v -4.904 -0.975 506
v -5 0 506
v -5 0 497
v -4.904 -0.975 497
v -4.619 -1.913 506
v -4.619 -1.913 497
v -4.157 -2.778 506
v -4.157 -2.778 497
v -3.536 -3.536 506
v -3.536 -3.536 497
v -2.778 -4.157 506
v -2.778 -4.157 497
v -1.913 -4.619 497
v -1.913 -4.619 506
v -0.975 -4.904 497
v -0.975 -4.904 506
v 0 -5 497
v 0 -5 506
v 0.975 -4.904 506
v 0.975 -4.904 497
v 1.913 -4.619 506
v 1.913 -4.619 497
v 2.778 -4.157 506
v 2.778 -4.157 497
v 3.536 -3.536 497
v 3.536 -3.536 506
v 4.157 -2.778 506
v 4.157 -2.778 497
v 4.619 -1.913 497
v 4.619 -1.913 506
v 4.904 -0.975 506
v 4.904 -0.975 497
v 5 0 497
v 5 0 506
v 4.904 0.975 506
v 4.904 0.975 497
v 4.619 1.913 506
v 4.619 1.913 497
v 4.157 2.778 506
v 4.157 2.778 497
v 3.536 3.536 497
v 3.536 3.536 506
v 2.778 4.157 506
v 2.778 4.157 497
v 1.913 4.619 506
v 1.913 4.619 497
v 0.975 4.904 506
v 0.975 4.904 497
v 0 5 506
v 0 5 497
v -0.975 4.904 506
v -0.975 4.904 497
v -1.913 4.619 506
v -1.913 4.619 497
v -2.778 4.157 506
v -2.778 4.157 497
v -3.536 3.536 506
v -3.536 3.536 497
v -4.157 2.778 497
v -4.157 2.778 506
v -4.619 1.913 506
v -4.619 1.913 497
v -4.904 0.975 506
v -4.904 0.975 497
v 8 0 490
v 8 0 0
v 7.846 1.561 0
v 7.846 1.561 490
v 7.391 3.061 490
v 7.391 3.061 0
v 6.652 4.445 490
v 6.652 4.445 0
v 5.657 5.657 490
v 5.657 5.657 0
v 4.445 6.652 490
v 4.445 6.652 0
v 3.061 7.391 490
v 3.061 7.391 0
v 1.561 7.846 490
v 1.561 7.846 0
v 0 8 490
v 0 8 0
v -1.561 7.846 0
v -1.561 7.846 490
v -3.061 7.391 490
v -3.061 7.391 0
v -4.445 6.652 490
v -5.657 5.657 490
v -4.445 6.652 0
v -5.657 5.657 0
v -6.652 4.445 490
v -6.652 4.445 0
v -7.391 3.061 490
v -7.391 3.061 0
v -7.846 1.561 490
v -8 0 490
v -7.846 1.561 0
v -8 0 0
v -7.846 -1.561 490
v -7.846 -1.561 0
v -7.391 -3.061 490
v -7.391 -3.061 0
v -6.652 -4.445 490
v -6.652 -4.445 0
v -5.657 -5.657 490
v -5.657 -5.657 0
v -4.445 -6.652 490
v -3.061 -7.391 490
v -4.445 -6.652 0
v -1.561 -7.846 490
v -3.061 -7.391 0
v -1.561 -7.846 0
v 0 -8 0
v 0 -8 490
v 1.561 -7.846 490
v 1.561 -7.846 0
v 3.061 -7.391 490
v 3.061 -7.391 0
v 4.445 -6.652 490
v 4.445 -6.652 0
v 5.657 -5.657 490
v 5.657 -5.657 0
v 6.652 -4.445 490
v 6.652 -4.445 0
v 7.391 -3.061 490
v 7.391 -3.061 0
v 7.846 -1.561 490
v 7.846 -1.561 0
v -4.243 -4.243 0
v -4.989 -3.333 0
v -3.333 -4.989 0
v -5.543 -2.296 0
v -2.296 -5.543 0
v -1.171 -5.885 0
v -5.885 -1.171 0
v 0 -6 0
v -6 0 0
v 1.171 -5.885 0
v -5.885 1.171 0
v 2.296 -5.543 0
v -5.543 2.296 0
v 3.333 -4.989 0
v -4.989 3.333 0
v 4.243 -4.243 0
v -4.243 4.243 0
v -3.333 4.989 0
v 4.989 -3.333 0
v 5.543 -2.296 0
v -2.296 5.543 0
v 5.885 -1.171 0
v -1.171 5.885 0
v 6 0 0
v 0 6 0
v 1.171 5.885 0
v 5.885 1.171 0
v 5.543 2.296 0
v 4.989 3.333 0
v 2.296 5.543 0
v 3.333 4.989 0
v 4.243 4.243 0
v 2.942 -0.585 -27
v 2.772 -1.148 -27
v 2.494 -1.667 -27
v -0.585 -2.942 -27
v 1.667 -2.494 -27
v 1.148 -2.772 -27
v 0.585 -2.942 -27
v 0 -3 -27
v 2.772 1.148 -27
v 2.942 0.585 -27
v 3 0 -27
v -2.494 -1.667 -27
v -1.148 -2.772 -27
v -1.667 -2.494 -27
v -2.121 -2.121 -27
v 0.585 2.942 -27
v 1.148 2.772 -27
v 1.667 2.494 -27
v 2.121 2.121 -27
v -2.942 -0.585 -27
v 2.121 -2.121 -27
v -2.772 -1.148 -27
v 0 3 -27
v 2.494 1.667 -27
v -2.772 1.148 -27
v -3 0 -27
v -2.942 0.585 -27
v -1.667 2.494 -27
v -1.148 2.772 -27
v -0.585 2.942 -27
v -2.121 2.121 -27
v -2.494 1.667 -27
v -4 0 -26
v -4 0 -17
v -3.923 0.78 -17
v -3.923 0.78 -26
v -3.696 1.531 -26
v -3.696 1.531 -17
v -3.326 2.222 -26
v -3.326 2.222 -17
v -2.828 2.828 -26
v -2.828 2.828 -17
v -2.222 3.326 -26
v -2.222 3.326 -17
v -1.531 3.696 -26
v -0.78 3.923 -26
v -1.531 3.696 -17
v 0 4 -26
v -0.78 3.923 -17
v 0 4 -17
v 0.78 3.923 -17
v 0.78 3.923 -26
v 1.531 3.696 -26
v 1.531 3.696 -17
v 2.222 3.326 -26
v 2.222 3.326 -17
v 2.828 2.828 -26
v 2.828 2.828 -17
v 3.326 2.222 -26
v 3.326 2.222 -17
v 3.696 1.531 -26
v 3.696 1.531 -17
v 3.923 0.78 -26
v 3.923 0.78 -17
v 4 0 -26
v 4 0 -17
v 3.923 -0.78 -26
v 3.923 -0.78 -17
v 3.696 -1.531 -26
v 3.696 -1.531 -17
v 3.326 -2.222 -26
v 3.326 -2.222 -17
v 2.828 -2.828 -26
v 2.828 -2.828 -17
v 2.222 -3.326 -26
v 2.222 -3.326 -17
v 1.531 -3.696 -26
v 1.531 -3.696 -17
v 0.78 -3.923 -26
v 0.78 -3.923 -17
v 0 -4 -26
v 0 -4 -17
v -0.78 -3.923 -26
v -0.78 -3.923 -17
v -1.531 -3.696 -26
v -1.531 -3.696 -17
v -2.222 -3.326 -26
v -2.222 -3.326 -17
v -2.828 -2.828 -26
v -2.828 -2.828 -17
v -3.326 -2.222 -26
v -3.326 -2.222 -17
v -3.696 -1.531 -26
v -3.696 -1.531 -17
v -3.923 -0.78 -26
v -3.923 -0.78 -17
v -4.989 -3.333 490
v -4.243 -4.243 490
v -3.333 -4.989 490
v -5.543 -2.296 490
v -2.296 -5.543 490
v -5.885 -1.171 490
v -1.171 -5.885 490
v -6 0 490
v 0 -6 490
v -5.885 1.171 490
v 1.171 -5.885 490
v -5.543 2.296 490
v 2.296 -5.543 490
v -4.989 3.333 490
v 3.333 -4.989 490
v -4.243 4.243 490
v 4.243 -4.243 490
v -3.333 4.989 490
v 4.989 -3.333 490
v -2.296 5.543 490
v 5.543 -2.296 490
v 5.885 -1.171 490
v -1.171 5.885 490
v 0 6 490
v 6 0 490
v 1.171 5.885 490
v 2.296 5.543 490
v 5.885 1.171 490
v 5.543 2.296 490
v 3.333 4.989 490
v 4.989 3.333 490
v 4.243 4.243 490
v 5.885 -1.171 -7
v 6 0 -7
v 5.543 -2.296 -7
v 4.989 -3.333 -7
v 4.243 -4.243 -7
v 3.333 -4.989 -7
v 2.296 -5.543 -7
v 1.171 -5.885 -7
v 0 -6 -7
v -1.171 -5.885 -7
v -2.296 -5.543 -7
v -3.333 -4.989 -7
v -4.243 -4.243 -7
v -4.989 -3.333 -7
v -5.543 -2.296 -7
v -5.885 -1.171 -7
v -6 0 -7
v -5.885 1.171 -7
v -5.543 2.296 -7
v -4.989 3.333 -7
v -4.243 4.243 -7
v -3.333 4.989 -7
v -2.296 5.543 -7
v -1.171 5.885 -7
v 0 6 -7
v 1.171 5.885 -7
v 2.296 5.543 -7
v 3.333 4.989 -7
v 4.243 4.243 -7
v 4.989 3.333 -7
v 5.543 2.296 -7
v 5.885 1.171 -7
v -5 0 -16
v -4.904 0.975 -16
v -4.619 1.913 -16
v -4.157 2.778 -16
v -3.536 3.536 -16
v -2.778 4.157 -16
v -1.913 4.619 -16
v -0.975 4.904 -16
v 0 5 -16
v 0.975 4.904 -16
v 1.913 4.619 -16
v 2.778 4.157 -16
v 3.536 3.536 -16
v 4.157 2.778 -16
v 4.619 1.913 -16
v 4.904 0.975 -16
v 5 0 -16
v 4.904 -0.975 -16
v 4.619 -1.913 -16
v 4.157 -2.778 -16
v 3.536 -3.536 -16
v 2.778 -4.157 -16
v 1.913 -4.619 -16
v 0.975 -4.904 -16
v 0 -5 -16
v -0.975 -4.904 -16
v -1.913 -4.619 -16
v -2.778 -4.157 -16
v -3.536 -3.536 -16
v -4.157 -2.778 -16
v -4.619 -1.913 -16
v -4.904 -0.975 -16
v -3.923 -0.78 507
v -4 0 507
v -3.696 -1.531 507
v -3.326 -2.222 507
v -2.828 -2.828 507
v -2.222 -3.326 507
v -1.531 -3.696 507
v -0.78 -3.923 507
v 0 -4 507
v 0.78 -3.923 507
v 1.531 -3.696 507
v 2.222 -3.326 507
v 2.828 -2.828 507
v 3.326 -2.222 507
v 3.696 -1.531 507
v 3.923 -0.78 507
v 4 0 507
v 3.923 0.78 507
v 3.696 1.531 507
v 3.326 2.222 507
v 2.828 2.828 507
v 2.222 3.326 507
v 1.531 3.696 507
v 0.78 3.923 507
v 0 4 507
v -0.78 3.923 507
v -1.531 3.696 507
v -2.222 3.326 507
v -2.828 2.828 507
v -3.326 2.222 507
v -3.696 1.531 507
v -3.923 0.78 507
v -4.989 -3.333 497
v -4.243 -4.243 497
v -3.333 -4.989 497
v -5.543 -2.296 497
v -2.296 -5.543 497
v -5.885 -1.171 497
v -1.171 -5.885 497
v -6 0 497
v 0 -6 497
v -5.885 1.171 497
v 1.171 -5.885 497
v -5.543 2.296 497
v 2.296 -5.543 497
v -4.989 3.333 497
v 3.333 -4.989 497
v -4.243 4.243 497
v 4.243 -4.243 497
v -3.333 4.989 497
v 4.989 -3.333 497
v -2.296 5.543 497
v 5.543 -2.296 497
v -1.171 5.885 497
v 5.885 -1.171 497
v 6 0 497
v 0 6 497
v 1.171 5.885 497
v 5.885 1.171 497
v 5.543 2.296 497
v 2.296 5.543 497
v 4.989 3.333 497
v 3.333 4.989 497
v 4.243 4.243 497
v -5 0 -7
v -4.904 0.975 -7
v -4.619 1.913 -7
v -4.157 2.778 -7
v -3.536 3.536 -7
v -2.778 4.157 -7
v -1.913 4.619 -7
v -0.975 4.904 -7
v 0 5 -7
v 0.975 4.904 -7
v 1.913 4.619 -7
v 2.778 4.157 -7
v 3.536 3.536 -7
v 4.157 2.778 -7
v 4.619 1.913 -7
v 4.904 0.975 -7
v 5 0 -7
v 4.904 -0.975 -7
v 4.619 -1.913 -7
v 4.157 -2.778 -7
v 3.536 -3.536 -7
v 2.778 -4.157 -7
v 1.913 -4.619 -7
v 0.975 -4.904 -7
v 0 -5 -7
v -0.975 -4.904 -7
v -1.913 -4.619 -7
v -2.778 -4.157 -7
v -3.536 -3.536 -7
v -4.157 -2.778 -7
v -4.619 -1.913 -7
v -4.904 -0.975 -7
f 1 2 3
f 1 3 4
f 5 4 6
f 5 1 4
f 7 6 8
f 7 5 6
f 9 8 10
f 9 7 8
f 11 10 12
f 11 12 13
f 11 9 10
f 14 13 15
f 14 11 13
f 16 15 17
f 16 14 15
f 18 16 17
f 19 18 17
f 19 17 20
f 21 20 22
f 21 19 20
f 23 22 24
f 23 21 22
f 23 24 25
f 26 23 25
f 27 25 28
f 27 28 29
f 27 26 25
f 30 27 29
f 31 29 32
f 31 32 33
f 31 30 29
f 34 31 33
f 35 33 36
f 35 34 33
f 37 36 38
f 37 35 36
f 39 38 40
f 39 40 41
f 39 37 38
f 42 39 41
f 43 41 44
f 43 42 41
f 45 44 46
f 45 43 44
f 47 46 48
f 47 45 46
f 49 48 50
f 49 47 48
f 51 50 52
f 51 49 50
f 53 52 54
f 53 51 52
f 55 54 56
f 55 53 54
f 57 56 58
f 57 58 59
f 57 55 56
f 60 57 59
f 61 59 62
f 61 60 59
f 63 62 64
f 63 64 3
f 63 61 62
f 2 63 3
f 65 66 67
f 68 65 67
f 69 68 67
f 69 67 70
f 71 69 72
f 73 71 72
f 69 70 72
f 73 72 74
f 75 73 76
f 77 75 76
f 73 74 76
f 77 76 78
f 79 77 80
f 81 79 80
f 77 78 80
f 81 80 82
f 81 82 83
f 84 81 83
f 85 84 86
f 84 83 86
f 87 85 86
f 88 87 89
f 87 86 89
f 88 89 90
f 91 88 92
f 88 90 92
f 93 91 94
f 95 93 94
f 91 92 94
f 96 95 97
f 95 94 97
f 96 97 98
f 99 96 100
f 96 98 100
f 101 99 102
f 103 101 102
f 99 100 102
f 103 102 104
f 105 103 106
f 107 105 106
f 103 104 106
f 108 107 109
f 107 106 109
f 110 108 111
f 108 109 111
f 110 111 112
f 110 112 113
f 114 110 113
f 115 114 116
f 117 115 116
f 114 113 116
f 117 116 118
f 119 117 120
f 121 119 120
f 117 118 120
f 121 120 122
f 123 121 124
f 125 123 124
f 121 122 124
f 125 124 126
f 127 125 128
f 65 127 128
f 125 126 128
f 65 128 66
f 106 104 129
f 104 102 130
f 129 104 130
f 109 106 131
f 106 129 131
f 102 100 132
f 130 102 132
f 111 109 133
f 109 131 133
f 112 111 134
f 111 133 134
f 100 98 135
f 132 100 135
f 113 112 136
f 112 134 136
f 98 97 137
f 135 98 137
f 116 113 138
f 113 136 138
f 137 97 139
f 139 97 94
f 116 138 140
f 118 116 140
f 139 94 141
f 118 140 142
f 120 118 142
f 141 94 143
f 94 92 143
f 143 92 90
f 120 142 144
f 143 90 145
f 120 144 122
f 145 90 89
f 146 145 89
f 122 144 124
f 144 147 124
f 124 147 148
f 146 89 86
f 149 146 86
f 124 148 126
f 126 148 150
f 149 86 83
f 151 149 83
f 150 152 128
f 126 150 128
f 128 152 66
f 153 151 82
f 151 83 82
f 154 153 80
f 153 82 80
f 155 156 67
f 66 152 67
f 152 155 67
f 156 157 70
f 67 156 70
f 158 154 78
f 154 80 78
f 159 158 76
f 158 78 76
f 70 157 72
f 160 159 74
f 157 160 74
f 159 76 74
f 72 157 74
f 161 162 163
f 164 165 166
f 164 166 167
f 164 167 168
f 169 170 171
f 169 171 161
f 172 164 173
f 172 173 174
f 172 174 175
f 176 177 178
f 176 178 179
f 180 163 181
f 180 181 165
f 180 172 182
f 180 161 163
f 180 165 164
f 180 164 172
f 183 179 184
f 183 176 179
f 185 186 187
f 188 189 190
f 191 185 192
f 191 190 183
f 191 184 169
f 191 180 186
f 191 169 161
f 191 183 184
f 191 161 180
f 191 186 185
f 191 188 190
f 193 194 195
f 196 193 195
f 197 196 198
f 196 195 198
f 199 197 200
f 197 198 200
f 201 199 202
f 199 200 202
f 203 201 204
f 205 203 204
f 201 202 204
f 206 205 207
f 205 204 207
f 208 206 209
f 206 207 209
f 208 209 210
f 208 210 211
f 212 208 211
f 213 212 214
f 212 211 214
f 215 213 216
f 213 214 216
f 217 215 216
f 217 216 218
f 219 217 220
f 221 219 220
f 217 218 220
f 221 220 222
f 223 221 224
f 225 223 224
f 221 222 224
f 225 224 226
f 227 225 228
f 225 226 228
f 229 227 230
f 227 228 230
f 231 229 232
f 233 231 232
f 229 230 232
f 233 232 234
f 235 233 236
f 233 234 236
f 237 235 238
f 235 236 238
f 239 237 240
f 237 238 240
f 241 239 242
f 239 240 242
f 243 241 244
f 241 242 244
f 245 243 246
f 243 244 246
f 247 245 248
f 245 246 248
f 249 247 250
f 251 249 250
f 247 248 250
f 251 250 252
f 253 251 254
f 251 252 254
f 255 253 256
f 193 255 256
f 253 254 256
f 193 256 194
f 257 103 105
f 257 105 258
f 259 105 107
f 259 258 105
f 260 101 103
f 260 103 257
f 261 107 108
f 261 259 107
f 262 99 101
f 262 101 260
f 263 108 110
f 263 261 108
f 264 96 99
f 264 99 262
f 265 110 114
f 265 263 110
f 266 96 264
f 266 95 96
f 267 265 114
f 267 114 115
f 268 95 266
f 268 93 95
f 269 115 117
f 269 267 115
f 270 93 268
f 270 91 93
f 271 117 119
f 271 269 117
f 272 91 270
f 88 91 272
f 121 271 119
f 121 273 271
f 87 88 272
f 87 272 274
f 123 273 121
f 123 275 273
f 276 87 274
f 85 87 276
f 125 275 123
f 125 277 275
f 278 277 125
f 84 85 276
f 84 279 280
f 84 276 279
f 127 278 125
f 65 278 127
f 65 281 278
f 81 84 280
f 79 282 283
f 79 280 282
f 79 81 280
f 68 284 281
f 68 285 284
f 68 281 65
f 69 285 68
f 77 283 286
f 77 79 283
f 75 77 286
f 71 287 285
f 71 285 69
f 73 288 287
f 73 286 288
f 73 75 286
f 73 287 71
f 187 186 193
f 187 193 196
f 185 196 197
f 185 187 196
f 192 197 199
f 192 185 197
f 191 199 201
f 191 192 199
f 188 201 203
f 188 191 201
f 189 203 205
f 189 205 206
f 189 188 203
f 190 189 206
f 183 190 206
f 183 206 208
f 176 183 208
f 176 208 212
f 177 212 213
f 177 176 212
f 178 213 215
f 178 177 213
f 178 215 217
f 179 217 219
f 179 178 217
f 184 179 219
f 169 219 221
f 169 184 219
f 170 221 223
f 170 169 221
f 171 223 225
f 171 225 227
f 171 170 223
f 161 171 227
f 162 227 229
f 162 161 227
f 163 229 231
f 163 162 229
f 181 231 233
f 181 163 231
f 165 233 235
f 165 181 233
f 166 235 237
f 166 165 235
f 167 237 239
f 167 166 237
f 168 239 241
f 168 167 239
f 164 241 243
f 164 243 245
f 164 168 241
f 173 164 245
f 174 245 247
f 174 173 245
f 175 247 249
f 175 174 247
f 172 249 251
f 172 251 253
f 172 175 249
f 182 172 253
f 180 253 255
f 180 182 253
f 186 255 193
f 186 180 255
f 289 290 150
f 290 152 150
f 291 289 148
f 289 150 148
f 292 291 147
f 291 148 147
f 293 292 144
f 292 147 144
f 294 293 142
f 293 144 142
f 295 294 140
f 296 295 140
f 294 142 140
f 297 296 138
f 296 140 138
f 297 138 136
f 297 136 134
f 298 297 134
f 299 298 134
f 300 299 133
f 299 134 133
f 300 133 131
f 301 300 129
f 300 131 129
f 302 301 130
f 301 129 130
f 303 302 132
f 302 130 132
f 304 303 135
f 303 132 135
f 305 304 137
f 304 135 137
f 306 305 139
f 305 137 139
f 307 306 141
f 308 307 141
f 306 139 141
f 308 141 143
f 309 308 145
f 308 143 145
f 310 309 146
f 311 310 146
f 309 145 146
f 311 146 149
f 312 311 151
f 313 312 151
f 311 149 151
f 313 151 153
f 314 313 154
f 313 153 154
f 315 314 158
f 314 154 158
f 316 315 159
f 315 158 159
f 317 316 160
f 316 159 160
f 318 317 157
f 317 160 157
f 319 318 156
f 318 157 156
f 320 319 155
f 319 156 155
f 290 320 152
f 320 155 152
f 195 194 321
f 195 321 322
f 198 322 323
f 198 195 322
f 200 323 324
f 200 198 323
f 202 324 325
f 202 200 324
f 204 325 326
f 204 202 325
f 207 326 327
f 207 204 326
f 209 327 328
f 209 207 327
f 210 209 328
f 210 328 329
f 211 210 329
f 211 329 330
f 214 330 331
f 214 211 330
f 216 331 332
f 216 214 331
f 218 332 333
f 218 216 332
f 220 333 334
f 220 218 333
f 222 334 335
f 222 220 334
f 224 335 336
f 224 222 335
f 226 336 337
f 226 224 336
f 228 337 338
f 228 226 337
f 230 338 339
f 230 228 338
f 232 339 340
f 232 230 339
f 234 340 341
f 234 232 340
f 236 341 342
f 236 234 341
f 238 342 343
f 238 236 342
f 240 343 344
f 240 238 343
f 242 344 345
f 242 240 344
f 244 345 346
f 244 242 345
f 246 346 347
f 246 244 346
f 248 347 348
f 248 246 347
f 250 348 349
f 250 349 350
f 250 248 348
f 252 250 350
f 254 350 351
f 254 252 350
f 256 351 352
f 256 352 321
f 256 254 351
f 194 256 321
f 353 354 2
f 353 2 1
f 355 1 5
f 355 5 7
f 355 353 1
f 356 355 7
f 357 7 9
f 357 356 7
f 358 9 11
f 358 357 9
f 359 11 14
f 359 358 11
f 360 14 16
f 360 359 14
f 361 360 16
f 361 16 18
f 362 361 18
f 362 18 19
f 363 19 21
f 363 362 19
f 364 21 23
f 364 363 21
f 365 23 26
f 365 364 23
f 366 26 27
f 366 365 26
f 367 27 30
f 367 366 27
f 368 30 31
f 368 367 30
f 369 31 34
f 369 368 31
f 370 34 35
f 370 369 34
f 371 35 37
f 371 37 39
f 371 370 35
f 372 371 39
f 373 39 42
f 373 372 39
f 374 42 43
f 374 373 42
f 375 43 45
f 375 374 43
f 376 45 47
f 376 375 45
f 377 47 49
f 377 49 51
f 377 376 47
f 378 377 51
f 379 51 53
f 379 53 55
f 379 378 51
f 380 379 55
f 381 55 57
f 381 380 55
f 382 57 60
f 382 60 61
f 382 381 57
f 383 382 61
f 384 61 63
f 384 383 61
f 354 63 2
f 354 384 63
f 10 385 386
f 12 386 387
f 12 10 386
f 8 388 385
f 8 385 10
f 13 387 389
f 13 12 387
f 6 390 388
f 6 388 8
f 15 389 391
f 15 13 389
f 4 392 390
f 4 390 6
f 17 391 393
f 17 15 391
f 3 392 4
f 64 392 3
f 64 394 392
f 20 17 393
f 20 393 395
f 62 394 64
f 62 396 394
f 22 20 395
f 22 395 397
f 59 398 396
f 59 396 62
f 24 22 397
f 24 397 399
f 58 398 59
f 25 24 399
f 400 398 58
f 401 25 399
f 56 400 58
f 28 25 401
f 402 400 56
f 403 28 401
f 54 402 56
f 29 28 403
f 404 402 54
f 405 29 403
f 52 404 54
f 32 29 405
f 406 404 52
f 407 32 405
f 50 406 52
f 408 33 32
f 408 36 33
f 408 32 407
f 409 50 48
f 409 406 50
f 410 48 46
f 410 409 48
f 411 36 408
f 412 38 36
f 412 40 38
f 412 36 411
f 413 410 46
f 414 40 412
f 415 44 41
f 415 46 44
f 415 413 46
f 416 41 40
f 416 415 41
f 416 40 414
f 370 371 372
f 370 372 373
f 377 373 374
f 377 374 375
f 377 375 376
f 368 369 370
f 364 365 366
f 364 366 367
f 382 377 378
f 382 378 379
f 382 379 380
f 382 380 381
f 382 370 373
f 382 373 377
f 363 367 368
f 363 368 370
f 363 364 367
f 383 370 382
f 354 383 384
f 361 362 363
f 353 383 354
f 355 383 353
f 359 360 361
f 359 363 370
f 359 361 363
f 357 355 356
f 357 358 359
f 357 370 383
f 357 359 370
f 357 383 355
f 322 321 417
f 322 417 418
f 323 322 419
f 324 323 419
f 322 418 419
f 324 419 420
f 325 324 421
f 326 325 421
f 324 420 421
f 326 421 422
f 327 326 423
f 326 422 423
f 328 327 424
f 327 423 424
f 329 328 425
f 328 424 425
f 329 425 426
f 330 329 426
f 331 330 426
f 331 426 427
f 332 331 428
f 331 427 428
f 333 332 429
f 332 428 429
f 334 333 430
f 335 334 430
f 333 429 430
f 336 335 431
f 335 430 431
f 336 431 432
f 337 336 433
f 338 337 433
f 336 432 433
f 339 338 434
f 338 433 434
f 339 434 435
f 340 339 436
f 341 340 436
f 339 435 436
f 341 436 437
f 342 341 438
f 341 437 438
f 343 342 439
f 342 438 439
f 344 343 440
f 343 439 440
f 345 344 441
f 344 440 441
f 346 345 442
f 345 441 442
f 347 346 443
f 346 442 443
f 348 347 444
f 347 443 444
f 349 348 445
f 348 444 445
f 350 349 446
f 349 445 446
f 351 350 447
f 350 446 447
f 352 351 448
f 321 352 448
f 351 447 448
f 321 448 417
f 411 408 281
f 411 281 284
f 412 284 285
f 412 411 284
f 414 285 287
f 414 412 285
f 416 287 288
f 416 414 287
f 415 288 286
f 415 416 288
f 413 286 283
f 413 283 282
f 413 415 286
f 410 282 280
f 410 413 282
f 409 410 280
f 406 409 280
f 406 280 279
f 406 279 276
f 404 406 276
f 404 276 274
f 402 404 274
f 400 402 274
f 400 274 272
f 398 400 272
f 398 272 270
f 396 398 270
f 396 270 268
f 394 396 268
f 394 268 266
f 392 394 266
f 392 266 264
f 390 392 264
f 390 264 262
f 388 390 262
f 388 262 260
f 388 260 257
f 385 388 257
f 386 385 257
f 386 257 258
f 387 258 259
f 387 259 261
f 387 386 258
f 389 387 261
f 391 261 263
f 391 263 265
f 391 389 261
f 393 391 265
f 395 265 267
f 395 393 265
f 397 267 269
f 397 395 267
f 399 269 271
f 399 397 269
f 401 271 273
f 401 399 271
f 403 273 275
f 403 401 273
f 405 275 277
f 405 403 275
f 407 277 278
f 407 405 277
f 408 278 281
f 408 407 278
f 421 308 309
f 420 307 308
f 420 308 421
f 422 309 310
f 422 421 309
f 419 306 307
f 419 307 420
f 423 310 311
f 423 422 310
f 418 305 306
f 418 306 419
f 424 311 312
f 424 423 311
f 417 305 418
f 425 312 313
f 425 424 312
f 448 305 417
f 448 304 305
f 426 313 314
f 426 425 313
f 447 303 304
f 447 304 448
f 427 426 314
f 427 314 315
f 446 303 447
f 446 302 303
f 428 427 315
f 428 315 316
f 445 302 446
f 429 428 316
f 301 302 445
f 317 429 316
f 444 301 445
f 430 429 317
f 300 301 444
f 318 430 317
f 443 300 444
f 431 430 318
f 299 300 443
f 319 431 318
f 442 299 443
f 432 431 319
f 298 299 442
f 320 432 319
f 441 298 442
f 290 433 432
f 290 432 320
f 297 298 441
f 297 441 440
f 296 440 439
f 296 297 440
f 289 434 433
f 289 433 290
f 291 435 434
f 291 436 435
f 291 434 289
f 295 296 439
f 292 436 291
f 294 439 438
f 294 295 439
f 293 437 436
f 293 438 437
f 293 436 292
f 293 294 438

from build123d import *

# Parameters (mm, degrees)
SKETCH1_R           = 8
BOSS_EXTRUDE1_DEPTH = 490
SKETCH6_R           = 6
BOSS_EXTRUDE2_DEPTH = 5
SKETCH7_R           = 6
BOSS_EXTRUDE3_DEPTH = 2
SKETCH8_R           = 5
BOSS_EXTRUDE4_DEPTH = 10
SKETCH9_R           = 4
BOSS_EXTRUDE5_DEPTH = 10
CHAMFER1_SIZE       = 1
CHAMFER2_SIZE       = 1
BOSS_EXTRUDE6_START = 5
SKETCH10_R          = 6
BOSS_EXTRUDE6_DEPTH = 5
BOSS_EXTRUDE7_START = 2
SKETCH11_R          = 6
BOSS_EXTRUDE7_DEPTH = 2
BOSS_EXTRUDE8_START = 10
SKETCH12_R          = 5
BOSS_EXTRUDE8_DEPTH = 10
CHAMFER3_SIZE       = 1


with BuildPart() as part:
    # Sketch1 → Boss-Extrude1 (new body)
    with BuildSketch(Plane.XY):
        Circle(SKETCH1_R)
    extrude(amount=BOSS_EXTRUDE1_DEPTH)

    # Sketch6 → Boss-Extrude2 (add)
    with BuildSketch(Plane(origin=(0, 0, 0), x_dir=(-1, 0, 0), z_dir=(0, 0, -1))):
        with Locations(Location((0, 0, 0), (0, 0, 180))):
            Circle(SKETCH6_R)
    extrude(amount=BOSS_EXTRUDE2_DEPTH)

    # Sketch7 → Boss-Extrude3 (add)
    with BuildSketch(Plane(origin=(0, 0, -5), x_dir=(-1, 0, 0), z_dir=(0, 0, -1))):
        with Locations(Location((0, 0, 0), (0, 0, 180))):
            Circle(SKETCH7_R)
    extrude(amount=BOSS_EXTRUDE3_DEPTH)

    # Sketch8 → Boss-Extrude4 (add)
    with BuildSketch(Plane(origin=(0, 0, -7), x_dir=(-1, 0, 0), z_dir=(0, 0, -1))):
        Circle(SKETCH8_R)
    extrude(amount=BOSS_EXTRUDE4_DEPTH)

    # Sketch9 → Boss-Extrude5 (add)
    with BuildSketch(Plane(origin=(0, 0, -17), x_dir=(-1, 0, 0), z_dir=(0, 0, -1))):
        Circle(SKETCH9_R)
    extrude(amount=BOSS_EXTRUDE5_DEPTH)

    # Chamfer1
    chamfer1_edges = [part.edges().sort_by_distance(p)[0] for p in [
        (5, 0, -17),
    ]]
    chamfer(chamfer1_edges, length=CHAMFER1_SIZE - 0.0001)  # a hair under: the kernel refuses the full size

    # Chamfer2
    chamfer2_edges = [part.edges().sort_by_distance(p)[0] for p in [
        (4, 0, -27),
    ]]
    chamfer(chamfer2_edges, length=CHAMFER2_SIZE)

    # Sketch10 → Boss-Extrude6 (add)
    with BuildSketch(Plane.XY.offset(490).offset(BOSS_EXTRUDE6_START)):
        Circle(SKETCH10_R)
    extrude(amount=-BOSS_EXTRUDE6_DEPTH)

    # Sketch11 → Boss-Extrude7 (add)
    with BuildSketch(Plane.XY.offset(495).offset(BOSS_EXTRUDE7_START)):
        Circle(SKETCH11_R)
    extrude(amount=-BOSS_EXTRUDE7_DEPTH)

    # Sketch12 → Boss-Extrude8 (add)
    with BuildSketch(Plane.XY.offset(497).offset(BOSS_EXTRUDE8_START)):
        with Locations(Location((0, 0, 0), (0, 0, 180))):
            Circle(SKETCH12_R)
    extrude(amount=-BOSS_EXTRUDE8_DEPTH)

    # Chamfer3
    chamfer3_edges = [part.edges().sort_by_distance(p)[0] for p in [
        (5, 0, 507),
    ]]
    chamfer(chamfer3_edges, length=CHAMFER3_SIZE)


solid = part.part
